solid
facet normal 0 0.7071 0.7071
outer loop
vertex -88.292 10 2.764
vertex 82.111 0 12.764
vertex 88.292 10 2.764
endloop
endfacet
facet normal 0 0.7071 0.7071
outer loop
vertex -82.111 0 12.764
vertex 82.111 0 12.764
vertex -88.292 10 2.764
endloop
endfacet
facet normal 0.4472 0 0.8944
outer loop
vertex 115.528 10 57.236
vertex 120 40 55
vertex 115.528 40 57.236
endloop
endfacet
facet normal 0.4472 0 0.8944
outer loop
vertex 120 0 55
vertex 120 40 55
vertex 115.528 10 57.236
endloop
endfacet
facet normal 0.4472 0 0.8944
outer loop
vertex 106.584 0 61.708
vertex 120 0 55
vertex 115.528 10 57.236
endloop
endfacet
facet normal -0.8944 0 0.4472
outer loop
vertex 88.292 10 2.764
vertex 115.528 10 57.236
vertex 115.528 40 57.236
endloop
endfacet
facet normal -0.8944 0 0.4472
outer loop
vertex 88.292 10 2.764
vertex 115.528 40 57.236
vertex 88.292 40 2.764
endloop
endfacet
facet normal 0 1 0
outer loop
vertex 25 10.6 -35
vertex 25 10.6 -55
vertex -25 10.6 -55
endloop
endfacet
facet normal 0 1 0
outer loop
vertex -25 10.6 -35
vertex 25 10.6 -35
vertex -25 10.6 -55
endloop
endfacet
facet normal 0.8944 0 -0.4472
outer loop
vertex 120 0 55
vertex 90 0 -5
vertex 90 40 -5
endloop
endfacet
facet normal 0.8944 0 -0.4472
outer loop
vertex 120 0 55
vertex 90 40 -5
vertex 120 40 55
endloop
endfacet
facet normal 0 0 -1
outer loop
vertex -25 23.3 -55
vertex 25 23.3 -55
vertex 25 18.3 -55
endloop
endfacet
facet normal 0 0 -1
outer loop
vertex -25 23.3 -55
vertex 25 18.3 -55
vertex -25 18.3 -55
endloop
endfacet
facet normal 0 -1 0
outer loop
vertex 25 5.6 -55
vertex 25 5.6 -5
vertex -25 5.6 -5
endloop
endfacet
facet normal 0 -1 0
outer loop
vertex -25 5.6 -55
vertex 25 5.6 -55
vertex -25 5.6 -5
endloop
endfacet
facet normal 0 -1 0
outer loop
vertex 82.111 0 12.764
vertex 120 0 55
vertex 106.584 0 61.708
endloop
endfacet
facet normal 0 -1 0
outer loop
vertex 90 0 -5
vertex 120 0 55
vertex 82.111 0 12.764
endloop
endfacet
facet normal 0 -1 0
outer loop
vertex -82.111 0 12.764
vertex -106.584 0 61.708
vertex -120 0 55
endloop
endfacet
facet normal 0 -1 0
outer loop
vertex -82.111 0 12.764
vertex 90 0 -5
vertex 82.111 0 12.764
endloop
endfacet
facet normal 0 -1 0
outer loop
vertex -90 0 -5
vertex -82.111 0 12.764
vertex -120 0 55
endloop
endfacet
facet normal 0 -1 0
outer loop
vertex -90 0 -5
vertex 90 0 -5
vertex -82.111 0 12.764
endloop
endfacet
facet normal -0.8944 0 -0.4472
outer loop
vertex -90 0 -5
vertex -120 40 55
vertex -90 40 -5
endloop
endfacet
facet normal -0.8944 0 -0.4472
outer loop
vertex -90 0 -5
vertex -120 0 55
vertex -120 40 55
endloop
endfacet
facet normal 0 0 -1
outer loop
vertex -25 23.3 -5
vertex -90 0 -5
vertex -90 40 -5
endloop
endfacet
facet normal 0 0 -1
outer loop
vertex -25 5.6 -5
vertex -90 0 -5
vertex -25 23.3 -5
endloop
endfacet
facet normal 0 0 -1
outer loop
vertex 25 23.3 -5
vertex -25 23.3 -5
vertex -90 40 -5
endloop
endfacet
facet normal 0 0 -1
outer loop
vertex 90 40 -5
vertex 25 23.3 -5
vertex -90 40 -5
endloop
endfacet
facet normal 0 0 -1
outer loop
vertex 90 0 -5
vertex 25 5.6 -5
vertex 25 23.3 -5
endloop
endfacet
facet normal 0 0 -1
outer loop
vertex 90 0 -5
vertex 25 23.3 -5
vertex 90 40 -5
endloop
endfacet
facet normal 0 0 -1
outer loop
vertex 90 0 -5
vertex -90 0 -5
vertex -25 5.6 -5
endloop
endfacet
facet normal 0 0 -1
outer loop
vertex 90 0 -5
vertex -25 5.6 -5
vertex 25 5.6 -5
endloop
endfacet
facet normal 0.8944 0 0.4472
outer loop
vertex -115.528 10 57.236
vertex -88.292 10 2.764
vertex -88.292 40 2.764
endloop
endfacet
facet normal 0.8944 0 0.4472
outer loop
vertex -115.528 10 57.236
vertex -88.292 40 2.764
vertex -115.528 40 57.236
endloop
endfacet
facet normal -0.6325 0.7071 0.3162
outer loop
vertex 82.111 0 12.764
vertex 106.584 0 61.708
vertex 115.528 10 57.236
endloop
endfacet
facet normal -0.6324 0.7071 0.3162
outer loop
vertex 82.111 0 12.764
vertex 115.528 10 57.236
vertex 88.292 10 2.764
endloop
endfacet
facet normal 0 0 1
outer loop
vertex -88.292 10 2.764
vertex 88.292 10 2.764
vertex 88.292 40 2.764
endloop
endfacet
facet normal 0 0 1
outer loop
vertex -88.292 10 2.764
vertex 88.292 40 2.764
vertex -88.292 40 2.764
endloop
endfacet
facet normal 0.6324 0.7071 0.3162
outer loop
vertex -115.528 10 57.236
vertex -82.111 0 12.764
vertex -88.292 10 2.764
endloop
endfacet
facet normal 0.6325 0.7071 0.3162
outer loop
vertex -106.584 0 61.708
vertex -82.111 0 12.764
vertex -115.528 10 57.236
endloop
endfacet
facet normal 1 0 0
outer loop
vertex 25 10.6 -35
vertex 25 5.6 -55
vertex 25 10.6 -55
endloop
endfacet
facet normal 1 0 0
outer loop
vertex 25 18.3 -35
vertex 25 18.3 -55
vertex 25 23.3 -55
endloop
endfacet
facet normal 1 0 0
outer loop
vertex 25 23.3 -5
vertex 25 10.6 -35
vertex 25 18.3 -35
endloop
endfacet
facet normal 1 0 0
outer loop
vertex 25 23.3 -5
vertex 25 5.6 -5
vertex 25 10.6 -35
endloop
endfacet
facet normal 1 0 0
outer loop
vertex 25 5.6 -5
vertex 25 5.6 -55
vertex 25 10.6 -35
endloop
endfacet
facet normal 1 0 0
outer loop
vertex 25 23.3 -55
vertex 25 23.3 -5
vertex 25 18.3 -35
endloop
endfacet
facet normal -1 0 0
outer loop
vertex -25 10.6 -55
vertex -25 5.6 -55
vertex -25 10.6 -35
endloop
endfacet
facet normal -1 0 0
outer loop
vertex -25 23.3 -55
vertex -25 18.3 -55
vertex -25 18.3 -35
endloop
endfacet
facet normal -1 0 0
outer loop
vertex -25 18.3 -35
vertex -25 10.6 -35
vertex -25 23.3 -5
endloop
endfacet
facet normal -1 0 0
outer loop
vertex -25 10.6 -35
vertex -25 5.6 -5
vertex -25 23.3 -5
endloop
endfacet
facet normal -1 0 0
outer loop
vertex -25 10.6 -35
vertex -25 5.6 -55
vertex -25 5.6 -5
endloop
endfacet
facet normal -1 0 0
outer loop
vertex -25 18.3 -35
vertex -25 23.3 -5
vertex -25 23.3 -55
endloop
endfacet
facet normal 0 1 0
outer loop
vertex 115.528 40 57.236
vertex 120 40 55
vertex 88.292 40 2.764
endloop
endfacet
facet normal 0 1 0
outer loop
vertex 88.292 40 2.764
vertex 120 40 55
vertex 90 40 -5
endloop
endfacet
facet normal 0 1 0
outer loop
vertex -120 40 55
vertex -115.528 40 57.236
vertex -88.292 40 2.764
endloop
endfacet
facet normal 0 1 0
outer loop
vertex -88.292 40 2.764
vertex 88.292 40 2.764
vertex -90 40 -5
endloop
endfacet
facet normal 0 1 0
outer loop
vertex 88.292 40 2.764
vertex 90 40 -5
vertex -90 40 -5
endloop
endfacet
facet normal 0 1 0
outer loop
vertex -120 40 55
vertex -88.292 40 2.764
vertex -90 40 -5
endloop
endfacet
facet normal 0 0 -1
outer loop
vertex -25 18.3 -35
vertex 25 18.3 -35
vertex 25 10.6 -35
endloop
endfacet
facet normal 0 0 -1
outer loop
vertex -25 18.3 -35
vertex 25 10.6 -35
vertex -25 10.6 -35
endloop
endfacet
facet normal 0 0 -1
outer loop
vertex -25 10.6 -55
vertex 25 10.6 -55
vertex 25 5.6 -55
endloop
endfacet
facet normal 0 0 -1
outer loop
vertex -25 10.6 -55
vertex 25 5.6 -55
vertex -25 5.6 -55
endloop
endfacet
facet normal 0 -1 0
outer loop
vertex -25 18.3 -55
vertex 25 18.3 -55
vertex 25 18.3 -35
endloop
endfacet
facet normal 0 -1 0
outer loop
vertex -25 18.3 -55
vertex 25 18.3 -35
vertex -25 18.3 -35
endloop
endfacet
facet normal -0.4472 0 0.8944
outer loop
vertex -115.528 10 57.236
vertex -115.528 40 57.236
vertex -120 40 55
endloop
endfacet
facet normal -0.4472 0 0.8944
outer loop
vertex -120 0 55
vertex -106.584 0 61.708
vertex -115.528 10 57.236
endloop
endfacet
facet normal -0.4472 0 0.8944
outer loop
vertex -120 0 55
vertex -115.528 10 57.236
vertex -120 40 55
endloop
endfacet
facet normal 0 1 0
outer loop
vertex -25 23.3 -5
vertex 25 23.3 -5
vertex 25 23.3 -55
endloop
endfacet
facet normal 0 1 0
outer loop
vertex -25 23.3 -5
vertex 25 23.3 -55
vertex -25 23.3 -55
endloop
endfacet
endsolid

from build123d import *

# Parameters (mm, degrees)
BOSS_EXTRUDE1_DEPTH = 10
DRAFT1_ANGLE        = 45
BOSS_EXTRUDE2_DEPTH = 30
SKETCH6_W           = 50
SKETCH6_H           = 17.7
BOSS_EXTRUDE3_DEPTH = 50
SKETCH7_W           = 50
SKETCH7_H           = 7.7
CUT_EXTRUDE4_DEPTH  = 20


with BuildPart() as part:
    # Sketch2 → Boss-Extrude1 (new body)
    with BuildSketch(Plane(origin=(0, 0, 0), x_dir=(1, 0, 0), z_dir=(0, 1, 0))):
        Polygon((-90, 5), (90, 5), (120, -55), (115.527864045, -57.236067977), (88.291796068, -2.763932023), (-88.291796068, -2.763932023), (-115.527864045, -57.236067977), (-120, -55), align=None)
    extrude(amount=BOSS_EXTRUDE1_DEPTH)

    # Draft1
    draft1_faces = [part.faces().sort_by_distance(p)[0] for p in [
        (101.909830056, 5, 30),
        (0, 5, 2.763932023),
        (-101.909830056, 5, 30),
    ]]
    draft(draft1_faces, Plane.ZX.offset(10), DRAFT1_ANGLE)

    # Sketch5 → Boss-Extrude2 (add)
    with BuildSketch(Plane(origin=(0, 10, 0), x_dir=(1, 0, 0), z_dir=(0, 1, 0))):
        Polygon((-120, -55), (-90, 5), (90, 5), (120, -55), (115.527864045, -57.236067977), (88.291796068, -2.763932023), (-88.291796068, -2.763932023), (-115.527864045, -57.236067977), align=None)
    extrude(amount=BOSS_EXTRUDE2_DEPTH)

    # Sketch6 → Boss-Extrude3 (add)
    with BuildSketch(Plane(origin=(0, 0, -5), x_dir=(-1, 0, 0), z_dir=(0, 0, -1))):
        with Locations((0, 14.45)):
            Rectangle(SKETCH6_W, SKETCH6_H)
    extrude(amount=BOSS_EXTRUDE3_DEPTH)

    # Sketch7 → Cut-Extrude4 (cut)
    with BuildSketch(Plane(origin=(0, 0, -55), x_dir=(-1, 0, 0), z_dir=(0, 0, -1))):
        with Locations((0, 14.45)):
            Rectangle(SKETCH7_W, SKETCH7_H)
    extrude(amount=-CUT_EXTRUDE4_DEPTH, mode=Mode.SUBTRACT)


solid = part.part
